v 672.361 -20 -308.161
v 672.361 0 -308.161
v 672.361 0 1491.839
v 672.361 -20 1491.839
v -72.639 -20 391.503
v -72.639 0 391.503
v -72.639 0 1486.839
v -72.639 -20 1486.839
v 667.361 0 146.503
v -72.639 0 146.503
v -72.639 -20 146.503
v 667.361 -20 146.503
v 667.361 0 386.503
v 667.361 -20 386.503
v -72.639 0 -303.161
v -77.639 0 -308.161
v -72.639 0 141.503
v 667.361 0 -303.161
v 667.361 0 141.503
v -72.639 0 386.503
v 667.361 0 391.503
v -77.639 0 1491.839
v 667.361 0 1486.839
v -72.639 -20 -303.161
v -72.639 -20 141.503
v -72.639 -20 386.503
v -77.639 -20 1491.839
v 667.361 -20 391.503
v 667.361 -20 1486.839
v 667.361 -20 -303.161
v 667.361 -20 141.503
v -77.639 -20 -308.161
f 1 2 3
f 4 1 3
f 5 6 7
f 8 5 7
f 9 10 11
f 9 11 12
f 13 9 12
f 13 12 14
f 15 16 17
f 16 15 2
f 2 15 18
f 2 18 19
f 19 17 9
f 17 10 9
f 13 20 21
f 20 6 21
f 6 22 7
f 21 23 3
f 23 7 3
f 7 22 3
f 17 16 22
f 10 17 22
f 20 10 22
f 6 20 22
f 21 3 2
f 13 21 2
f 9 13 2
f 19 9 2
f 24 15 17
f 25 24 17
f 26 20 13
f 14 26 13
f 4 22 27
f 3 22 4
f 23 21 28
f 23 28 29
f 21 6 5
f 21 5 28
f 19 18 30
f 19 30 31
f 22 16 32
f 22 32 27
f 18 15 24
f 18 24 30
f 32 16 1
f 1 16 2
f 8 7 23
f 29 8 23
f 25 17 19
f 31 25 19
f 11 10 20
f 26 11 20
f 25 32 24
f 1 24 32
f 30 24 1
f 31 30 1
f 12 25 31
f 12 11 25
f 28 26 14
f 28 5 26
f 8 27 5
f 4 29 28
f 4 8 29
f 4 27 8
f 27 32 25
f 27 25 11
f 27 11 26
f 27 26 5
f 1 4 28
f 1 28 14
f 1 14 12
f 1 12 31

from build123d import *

# Parameters (mm, degrees)
F0_W     = 750
F0_H     = 1800
F0_W_2   = 739.999995
F0_H_2   = 1789.999995
F1_DEPTH = 20
F2_W     = 748.980001
F2_H     = 5
F2_W_2   = 744.481355
F3_DEPTH = 20


with BuildPart() as f1:
    # F0 (on Front) → F1 (new body)
    with BuildSketch(Plane.XZ):
        with Locations((297.36115, 591.838682)):
            Rectangle(F0_W, F0_H)
        with Locations((297.361151, 591.838682)):
            Rectangle(F0_W_2, F0_H_2, mode=Mode.SUBTRACT)
    extrude(amount=F1_DEPTH)

    # F2 (on Front) → F3 (join)
    with BuildSketch(Plane.XZ):
        with Locations((297.594332, 389.002619)):
            Rectangle(F2_W, F2_H)
        with Locations((297.196076, 144.002619)):
            Rectangle(F2_W_2, F2_H)
    extrude(amount=F3_DEPTH)


solid = f1.part
